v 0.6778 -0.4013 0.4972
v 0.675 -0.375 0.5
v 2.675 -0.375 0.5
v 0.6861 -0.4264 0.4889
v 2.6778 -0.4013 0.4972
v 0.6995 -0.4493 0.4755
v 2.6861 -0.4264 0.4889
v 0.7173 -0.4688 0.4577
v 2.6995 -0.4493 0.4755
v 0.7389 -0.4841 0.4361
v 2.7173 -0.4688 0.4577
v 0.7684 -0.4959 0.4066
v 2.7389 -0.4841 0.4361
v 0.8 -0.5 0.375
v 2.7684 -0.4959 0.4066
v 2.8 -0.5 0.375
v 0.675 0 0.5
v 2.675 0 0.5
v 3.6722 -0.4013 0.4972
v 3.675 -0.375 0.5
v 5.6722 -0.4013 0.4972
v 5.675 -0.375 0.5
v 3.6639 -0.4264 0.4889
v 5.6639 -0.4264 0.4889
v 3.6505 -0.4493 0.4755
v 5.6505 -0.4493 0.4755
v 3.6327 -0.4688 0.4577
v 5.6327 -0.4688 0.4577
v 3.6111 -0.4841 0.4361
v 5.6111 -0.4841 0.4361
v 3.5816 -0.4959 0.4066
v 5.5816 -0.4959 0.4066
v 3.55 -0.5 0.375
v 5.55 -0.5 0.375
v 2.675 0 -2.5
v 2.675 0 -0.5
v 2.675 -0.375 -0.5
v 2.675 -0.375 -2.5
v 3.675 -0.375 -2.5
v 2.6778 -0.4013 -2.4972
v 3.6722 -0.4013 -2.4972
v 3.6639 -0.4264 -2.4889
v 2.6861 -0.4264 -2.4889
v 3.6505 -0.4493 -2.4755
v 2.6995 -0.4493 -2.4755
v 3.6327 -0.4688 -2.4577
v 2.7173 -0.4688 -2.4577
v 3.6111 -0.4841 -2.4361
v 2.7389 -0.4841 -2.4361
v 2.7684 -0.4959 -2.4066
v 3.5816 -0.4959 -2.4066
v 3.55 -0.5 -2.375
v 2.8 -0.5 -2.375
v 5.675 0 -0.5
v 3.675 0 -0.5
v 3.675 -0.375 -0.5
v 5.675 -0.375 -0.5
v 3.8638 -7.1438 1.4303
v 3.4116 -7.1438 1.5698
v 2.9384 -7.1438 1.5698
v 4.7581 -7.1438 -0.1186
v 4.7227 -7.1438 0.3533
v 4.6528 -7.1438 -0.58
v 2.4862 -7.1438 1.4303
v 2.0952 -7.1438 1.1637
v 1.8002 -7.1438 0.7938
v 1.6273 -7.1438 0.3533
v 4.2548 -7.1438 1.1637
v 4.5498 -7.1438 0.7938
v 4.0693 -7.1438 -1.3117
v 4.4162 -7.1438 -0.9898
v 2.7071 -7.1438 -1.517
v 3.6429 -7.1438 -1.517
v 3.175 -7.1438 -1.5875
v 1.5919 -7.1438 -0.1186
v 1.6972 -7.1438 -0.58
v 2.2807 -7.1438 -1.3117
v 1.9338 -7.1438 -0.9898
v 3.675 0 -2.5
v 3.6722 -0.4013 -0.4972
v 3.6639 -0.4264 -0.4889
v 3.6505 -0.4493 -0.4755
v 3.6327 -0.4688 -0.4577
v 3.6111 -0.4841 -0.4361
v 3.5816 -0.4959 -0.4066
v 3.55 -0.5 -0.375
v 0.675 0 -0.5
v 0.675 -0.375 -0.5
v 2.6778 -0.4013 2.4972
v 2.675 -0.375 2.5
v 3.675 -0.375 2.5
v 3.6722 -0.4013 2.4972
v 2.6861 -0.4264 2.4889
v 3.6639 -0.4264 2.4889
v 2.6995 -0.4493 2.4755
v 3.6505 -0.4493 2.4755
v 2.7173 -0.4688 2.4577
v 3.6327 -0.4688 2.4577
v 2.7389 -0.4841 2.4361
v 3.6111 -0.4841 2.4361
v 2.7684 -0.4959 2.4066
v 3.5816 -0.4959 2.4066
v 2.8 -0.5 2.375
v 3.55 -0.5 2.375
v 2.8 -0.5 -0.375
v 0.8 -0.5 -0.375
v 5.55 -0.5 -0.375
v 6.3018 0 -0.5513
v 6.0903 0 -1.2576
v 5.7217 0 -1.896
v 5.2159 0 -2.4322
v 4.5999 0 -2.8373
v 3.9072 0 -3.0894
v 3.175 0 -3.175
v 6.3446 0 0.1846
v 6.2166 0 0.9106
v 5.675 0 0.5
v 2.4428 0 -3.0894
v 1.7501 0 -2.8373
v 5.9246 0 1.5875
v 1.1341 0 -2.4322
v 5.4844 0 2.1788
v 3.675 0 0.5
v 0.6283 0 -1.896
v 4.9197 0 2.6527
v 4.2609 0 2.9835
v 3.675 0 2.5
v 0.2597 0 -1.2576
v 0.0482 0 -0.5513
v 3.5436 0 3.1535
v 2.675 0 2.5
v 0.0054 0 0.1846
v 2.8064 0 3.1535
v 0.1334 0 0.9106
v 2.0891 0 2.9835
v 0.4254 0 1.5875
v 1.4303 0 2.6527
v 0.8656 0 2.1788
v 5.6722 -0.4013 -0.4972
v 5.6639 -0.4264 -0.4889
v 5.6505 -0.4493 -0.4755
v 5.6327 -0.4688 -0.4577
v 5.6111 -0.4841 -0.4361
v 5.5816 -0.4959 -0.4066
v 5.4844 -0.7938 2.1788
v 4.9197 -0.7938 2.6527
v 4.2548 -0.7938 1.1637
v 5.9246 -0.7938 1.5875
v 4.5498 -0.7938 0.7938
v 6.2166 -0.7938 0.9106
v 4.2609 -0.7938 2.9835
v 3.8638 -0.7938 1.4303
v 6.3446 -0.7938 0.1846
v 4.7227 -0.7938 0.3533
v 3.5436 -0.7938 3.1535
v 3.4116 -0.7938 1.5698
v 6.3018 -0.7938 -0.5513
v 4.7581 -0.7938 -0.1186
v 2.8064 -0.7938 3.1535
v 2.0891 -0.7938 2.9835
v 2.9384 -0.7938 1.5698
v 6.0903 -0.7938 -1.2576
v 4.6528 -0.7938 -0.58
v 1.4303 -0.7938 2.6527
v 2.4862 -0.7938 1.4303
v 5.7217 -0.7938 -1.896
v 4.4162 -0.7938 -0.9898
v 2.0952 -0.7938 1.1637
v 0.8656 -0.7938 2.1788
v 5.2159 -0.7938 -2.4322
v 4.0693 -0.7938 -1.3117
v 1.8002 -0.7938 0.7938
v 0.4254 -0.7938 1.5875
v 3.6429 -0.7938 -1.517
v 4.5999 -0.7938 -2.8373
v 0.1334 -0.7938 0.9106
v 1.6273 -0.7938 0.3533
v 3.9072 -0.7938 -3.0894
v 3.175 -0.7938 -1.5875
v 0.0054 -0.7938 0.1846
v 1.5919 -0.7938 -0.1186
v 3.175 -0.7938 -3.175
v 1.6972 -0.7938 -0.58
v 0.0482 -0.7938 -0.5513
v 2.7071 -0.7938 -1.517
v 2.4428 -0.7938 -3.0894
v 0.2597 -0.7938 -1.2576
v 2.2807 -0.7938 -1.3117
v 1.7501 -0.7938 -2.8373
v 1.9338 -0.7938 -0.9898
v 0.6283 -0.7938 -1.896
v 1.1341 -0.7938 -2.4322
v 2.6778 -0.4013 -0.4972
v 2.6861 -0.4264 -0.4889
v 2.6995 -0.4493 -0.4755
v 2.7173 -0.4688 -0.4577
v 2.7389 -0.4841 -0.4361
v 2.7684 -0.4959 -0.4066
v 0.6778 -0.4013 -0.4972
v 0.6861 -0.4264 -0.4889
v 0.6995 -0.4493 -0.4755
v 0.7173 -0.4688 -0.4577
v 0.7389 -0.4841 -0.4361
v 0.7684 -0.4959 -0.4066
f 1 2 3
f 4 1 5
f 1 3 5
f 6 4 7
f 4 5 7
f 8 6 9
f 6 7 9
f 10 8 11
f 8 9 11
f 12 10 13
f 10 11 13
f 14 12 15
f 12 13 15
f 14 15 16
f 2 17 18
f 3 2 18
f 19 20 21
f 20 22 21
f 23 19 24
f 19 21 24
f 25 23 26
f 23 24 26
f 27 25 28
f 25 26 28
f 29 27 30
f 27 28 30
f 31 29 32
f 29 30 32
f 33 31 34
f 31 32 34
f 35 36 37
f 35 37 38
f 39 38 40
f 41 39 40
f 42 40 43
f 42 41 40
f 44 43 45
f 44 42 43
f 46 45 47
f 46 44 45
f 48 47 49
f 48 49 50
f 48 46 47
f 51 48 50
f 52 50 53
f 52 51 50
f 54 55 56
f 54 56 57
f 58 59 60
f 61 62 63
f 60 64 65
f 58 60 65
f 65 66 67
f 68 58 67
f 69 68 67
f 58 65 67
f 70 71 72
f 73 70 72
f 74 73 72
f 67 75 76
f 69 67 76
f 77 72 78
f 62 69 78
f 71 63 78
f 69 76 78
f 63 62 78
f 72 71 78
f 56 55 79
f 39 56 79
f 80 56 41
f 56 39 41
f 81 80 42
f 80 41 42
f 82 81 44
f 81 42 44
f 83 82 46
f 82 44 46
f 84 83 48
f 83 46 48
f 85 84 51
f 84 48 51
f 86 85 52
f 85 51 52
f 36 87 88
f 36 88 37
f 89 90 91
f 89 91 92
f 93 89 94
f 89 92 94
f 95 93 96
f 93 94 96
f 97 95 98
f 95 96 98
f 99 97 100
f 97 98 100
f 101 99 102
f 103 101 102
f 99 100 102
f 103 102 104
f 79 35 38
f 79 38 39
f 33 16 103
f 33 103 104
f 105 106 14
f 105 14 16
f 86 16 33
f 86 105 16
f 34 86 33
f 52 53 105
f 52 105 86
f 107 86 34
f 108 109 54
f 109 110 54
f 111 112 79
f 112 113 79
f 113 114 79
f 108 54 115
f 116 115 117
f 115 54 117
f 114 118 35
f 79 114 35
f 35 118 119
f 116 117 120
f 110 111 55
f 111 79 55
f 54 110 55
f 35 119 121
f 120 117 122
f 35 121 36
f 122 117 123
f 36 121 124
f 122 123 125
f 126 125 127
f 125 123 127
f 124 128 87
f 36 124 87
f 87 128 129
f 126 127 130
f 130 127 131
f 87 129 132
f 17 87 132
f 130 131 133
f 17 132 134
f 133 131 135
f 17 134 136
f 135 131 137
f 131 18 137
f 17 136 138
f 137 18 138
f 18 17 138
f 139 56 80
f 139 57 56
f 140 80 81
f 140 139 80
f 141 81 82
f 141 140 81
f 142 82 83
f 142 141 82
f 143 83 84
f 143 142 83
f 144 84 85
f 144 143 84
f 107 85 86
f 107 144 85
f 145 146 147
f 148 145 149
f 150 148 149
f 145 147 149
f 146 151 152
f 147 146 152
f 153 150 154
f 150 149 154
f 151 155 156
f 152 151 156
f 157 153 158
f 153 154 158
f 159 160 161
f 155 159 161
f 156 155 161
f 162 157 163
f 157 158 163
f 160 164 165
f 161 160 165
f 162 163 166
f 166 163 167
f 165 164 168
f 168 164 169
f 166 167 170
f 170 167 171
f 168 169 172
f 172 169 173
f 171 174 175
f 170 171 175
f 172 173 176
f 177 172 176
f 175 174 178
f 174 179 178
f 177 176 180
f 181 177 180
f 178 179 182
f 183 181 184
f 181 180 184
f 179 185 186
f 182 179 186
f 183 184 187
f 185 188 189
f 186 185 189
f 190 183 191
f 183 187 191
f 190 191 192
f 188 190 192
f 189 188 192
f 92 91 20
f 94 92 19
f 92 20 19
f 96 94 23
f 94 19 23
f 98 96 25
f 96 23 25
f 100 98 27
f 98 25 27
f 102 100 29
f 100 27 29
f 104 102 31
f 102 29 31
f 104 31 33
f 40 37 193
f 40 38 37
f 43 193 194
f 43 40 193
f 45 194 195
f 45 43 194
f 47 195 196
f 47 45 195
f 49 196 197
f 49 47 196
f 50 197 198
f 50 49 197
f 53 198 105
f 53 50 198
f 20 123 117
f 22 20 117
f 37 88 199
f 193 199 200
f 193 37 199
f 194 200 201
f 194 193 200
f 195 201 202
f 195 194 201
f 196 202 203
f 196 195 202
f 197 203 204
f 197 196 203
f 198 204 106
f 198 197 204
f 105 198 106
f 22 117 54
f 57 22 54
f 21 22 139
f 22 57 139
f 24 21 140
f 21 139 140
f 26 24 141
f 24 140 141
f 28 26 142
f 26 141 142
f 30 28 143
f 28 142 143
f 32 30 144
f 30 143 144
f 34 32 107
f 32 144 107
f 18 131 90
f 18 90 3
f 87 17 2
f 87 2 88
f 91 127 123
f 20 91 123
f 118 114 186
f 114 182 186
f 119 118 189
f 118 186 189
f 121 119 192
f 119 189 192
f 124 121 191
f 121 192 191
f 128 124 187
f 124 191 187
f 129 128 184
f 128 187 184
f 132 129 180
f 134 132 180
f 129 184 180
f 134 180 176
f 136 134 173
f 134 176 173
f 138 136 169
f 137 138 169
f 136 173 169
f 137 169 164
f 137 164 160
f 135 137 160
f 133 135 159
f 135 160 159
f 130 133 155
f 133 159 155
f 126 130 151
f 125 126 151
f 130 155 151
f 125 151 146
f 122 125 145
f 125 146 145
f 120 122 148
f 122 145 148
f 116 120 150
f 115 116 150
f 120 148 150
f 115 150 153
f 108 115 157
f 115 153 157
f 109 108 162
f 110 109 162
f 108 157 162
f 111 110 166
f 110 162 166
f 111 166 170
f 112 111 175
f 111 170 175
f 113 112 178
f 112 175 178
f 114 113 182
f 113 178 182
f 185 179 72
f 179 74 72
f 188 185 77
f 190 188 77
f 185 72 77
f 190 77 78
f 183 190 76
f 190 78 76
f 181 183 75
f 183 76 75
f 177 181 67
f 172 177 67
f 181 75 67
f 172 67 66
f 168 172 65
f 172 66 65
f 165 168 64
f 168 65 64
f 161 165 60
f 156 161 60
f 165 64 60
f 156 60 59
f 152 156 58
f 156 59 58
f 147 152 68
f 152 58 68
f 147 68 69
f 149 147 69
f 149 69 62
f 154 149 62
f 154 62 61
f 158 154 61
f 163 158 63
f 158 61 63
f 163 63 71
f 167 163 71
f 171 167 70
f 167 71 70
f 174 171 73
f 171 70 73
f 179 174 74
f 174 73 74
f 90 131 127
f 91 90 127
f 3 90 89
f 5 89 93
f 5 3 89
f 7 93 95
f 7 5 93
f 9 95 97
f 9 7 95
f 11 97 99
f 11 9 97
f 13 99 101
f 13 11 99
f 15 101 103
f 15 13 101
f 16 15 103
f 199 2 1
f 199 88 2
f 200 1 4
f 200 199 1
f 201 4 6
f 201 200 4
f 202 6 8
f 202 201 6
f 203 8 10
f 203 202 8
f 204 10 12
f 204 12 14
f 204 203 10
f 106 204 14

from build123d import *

# Parameters (mm, degrees)
SKETCH2_W               = 5
SKETCH2_H               = 1
SKETCH2_W_2             = 1
SKETCH2_H_2             = 5
CUT_EXTRUDE_THIN1_DEPTH = 0.5
FILLET2_R               = 0.125


with BuildPart() as part:
    # Sketch1 → Revolve1 (revolve)
    with BuildSketch(Plane.XY, mode=Mode.PRIVATE) as revolve1_sk:
        Polygon((0, 0), (0, -0.79375), (1.5875, -0.79375), (1.5875, -7.14375), (3.175, -7.14375), (3.175, 0), align=None)
    revolve(revolve1_sk.sketch.rotate(Axis((3.175, -7.14375, 0), (0, 1, 0)), 270), axis=Axis((3.175, -7.14375, 0), (0, 1, 0)))

    # Sketch2 → Cut-Extrude-Thin1 (cut)
    with BuildSketch(Plane(origin=(0, 0, 0), x_dir=(1, 0, 0), z_dir=(0, 1, 0))):
        with Locations((3.175, 0)):
            Rectangle(SKETCH2_W, SKETCH2_H)
        with Locations((3.175, 0)):
            Rectangle(SKETCH2_W_2, SKETCH2_H_2)
    extrude(amount=-CUT_EXTRUDE_THIN1_DEPTH, mode=Mode.SUBTRACT)

    # Fillet2
    fillet2_edges = [part.edges().sort_by_distance(p)[0] for p in [
        (4.675, -0.5, 0.5),
        (1.675, -0.5, 0.5),
        (1.675, -0.5, -0.5),
        (3.175, -0.5, -2.5),
        (3.675, -0.5, -1.5),
        (4.675, -0.5, -0.5),
        (5.675, -0.5, 0),
        (3.675, -0.5, 1.5),
        (3.175, -0.5, 2.5),
        (0.675, -0.5, 0),
        (2.675, -0.5, -1.5),
        (2.675, -0.5, 1.5),
    ]]
    fillet(fillet2_edges, radius=FILLET2_R)


solid = part.part
